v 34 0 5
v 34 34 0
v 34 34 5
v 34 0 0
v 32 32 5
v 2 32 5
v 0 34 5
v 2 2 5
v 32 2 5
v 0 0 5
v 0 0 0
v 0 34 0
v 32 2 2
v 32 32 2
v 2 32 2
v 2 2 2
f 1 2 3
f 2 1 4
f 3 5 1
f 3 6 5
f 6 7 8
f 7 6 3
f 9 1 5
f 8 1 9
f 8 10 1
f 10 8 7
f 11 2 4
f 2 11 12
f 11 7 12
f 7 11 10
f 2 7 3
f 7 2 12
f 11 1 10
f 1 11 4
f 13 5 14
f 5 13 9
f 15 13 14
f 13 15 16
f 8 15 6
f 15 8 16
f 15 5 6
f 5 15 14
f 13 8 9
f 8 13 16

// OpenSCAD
eps=1/128;
$fn=100;

w=2;
h=5;
i=30;

difference() {
    cube([i+w*2, i+w*2, h]);
    translate([w,w,w]) cube([i, i, h-w+1]);
}
